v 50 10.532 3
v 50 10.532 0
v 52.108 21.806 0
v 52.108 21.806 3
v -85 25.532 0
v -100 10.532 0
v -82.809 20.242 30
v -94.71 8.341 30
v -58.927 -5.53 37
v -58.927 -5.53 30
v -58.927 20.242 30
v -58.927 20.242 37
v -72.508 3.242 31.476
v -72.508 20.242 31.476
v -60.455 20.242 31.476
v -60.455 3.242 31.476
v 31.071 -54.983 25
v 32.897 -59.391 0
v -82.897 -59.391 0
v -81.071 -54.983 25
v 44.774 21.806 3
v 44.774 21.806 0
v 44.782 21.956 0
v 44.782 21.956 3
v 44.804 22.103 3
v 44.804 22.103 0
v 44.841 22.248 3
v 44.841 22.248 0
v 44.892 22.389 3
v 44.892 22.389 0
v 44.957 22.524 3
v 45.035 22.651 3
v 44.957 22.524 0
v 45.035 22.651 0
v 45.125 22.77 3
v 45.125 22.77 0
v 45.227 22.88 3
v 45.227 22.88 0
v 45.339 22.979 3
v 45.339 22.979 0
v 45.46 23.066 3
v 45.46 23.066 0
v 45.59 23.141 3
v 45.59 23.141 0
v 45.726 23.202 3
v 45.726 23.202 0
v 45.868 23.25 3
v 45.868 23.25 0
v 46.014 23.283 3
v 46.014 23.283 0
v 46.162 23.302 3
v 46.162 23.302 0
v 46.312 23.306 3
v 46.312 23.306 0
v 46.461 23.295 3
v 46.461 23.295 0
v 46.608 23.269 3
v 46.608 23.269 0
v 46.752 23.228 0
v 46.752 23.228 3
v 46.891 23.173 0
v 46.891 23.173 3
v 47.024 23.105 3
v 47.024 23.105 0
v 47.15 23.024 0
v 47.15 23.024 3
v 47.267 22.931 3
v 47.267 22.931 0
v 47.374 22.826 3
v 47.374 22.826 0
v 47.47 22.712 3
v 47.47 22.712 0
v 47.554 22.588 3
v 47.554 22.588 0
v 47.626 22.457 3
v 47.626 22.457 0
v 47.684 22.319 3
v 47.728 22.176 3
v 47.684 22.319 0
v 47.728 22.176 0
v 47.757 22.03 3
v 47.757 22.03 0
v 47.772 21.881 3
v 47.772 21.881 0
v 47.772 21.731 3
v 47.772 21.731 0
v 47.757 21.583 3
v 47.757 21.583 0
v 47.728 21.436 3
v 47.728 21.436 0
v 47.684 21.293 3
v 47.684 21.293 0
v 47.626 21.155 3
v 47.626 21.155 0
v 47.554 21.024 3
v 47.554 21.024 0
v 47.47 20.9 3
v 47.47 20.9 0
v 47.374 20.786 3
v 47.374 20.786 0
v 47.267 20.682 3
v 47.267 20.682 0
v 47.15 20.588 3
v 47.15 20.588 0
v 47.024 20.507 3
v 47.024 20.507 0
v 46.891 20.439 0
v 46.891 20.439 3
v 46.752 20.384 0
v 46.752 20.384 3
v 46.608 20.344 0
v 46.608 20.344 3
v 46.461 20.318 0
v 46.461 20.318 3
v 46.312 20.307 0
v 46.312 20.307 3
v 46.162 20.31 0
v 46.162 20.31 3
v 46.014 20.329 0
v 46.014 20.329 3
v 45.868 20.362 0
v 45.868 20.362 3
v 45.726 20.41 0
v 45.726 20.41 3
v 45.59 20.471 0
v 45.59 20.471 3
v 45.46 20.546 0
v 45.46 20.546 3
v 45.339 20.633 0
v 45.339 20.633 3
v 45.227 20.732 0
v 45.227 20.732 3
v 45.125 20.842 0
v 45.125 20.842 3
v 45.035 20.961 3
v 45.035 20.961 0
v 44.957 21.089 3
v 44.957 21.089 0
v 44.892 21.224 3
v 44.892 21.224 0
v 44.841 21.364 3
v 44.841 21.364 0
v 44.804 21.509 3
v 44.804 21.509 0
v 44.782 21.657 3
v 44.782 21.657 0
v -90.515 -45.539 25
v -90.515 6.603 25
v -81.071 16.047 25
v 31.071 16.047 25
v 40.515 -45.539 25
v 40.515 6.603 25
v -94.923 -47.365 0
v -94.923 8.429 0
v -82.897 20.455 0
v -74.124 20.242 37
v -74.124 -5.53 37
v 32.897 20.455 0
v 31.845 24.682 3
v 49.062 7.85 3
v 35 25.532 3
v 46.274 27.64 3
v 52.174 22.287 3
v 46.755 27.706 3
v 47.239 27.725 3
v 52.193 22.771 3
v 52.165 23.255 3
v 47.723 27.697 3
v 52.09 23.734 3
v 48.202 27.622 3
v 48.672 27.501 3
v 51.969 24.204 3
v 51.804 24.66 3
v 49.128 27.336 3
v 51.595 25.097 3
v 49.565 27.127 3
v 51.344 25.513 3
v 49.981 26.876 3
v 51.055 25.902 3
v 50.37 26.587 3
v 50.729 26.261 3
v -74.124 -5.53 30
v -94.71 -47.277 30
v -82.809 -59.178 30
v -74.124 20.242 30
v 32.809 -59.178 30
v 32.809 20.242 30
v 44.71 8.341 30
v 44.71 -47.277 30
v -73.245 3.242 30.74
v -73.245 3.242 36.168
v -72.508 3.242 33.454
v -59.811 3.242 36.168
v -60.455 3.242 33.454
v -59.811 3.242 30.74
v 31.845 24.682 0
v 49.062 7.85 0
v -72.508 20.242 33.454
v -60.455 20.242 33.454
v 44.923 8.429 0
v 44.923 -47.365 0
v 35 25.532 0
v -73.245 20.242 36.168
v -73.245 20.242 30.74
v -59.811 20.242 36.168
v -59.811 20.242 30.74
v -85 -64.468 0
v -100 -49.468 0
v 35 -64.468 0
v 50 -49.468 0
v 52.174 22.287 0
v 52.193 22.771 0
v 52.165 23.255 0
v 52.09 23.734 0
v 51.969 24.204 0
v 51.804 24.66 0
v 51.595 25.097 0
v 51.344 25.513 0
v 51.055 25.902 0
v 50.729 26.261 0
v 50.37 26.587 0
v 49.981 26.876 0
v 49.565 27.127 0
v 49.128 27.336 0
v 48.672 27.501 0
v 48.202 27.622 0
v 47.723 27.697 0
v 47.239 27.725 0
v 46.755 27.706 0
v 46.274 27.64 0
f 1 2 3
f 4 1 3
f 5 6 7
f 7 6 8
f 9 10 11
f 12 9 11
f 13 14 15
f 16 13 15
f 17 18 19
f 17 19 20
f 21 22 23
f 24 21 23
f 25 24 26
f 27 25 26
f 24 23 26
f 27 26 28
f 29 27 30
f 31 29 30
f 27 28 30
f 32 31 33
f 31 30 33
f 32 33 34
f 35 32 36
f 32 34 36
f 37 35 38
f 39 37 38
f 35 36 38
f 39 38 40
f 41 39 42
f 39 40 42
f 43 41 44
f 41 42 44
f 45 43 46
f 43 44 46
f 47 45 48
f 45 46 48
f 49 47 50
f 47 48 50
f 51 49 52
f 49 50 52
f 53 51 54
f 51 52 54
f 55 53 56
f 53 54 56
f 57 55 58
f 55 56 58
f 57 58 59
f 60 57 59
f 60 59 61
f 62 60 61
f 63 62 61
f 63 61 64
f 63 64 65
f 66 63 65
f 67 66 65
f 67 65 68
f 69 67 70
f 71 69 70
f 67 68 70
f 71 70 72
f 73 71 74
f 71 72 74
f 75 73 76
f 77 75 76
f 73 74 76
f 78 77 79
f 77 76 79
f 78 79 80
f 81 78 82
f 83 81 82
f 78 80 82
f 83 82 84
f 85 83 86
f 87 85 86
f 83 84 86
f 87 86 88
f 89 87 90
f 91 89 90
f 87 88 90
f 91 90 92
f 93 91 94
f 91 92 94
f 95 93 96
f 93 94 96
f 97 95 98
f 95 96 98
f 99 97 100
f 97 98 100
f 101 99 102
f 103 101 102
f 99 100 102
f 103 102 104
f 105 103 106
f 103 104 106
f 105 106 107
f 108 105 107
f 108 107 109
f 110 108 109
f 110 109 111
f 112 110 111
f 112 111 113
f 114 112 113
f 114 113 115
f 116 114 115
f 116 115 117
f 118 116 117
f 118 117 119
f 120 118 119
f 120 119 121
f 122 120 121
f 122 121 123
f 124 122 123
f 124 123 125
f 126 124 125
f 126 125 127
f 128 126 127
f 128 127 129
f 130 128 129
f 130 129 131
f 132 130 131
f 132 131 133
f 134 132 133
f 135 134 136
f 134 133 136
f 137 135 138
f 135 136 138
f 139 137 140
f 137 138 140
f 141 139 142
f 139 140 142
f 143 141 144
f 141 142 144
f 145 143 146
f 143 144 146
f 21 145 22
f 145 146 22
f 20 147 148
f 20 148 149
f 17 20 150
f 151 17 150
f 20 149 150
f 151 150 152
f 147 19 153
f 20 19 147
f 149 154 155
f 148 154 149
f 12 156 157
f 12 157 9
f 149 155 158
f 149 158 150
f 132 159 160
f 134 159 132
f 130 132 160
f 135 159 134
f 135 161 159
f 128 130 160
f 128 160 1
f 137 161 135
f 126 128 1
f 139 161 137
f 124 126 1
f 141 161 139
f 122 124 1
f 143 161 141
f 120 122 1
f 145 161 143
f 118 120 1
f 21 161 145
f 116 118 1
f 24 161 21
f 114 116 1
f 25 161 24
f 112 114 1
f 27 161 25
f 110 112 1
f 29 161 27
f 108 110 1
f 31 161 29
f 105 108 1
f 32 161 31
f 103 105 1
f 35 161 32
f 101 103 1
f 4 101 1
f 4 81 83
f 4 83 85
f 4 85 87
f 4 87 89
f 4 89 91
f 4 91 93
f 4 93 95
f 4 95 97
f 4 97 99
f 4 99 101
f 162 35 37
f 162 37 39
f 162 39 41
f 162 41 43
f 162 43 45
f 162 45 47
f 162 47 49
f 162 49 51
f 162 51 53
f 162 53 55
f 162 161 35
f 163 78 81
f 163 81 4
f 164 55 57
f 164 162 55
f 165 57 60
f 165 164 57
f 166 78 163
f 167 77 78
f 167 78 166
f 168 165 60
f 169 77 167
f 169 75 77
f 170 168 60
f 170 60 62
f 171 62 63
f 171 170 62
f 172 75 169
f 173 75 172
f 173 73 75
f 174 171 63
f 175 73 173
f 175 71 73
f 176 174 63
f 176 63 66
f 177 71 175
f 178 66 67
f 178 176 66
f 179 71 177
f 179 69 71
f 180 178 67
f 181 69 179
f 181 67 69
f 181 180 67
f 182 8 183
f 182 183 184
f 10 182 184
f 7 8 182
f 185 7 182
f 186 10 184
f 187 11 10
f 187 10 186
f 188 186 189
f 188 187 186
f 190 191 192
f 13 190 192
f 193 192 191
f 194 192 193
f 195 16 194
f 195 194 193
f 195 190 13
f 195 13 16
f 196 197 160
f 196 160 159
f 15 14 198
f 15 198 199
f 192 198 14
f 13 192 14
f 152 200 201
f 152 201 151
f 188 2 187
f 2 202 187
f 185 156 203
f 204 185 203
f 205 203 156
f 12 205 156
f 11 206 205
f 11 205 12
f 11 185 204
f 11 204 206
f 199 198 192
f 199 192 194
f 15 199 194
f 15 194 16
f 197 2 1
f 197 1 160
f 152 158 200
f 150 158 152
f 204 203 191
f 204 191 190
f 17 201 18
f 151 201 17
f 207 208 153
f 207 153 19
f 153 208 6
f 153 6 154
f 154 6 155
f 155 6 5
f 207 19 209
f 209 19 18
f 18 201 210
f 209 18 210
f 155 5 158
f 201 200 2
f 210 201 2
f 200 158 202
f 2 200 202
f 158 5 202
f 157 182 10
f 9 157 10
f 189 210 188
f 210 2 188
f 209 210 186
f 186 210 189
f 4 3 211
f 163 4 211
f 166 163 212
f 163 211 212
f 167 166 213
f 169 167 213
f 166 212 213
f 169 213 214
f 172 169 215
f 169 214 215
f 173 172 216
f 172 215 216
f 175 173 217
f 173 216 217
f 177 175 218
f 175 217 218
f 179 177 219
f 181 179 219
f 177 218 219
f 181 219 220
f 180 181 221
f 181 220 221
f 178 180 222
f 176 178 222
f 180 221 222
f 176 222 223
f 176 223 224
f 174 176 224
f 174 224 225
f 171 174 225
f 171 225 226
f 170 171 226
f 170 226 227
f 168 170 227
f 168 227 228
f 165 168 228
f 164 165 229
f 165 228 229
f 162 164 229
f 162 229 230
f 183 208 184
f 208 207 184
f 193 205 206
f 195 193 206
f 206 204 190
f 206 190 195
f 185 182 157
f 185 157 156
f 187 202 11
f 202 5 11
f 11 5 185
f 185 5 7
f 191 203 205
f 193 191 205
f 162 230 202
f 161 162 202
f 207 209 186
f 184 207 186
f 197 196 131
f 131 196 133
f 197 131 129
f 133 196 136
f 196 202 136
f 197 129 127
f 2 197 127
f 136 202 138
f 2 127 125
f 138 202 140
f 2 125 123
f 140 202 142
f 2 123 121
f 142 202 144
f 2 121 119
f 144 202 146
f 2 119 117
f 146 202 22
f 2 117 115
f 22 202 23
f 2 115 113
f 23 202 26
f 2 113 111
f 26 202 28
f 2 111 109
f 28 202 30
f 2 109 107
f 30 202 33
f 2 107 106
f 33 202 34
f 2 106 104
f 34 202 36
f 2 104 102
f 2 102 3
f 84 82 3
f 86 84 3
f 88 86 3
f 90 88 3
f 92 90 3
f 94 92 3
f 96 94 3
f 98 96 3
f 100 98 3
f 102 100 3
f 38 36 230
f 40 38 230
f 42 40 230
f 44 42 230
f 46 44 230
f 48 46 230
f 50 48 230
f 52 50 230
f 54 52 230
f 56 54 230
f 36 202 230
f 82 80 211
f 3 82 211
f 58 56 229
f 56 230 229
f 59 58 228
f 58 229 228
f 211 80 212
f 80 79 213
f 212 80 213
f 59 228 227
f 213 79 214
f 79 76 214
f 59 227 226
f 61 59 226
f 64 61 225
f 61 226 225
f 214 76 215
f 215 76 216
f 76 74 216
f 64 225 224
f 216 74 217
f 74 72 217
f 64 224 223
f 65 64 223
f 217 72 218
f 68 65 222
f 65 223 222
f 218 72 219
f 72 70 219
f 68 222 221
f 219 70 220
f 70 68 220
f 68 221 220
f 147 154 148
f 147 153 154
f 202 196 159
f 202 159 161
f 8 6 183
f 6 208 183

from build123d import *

# Parameters (mm, degrees)
BOSS_EXTRUDE1_DEPTH = 30
BOSS_EXTRUDE1_TAPER = 10
SHELL1_T            = -5
SKETCH6_W           = 15.197518051
SKETCH6_H           = 25.772318446
BOSS_EXTRUDE4_DEPTH = 7
SKETCH7_W           = 13.433844537
SKETCH7_H           = 5.428745395
SKETCH7_W_2         = 12.053655029
SKETCH7_H_2         = 1.978271627
CUT_EXTRUDE2_DEPTH  = 17
SKETCH8_R           = 1.5
BOSS_EXTRUDE5_DEPTH = 3


with BuildPart() as part:
    # Sketch1 → Boss-Extrude1 (new body)
    with BuildSketch(Plane.XY):
        Polygon((-100, 10.531931481), (-100, -49.468068519), (-85, -64.468068519), (35, -64.468068519), (50, -49.468068519), (50, 10.531931481), (35, 25.531931481), (-85, 25.531931481), align=None)
    extrude(amount=BOSS_EXTRUDE1_DEPTH, taper=BOSS_EXTRUDE1_TAPER)

    # Shell1
    shell1_openings = [part.faces().sort_by_distance(p)[0] for p in [
        (-25, -19.468068519, 0),
    ]]
    offset(amount=SHELL1_T, openings=shell1_openings, kind=Kind.INTERSECTION)

    # Sketch6 → Boss-Extrude4 (add)
    with BuildSketch(Plane.XY.offset(30)):
        with Locations((-66.525501272, 7.355962837)):
            Rectangle(SKETCH6_W, SKETCH6_H)
    extrude(amount=BOSS_EXTRUDE4_DEPTH)

    # Sketch7 → Cut-Extrude2 (cut)
    with BuildSketch(Plane(origin=(0, 20.24212206, 0), x_dir=(1, 0, 0), z_dir=(0, 1, 0))):
        with Locations((-66.527599538, -33.454113167)):
            Rectangle(SKETCH7_W, SKETCH7_H)
        with Locations((-66.481593222, -32.464977353)):
            Rectangle(SKETCH7_W_2, SKETCH7_H_2, mode=Mode.SUBTRACT)
    extrude(amount=-CUT_EXTRUDE2_DEPTH, mode=Mode.SUBTRACT)


with BuildPart() as body_2:
    # Sketch8 → Boss-Extrude5 (new body)
    with BuildSketch(Plane(origin=(0, 0, 0), x_dir=(-1, 0, 0), z_dir=(0, 0, -1))):
        with BuildLine():
            ThreePointArc((-52.108034043, 21.80617699), (-50.728742794, 26.260674275), (-46.274245509, 27.639965524))
            Line((-46.274245509, 27.639965524), (-35, 25.531931481))
            Line((-35, 25.531931481), (-50, 10.531931481))
            Line((-50, 10.531931481), (-52.108034043, 21.80617699))
        make_face()
        with Locations((-46.274245509, 21.80617699)):
            Circle(SKETCH8_R, mode=Mode.SUBTRACT)
        Polygon((-49.062232862, 7.849935369), (-31.845274645, 24.682449772), (-35, 25.531931481), (-50, 10.531931481), align=None)
    extrude(amount=-BOSS_EXTRUDE5_DEPTH)


solid = Compound([part.part, body_2.part])
